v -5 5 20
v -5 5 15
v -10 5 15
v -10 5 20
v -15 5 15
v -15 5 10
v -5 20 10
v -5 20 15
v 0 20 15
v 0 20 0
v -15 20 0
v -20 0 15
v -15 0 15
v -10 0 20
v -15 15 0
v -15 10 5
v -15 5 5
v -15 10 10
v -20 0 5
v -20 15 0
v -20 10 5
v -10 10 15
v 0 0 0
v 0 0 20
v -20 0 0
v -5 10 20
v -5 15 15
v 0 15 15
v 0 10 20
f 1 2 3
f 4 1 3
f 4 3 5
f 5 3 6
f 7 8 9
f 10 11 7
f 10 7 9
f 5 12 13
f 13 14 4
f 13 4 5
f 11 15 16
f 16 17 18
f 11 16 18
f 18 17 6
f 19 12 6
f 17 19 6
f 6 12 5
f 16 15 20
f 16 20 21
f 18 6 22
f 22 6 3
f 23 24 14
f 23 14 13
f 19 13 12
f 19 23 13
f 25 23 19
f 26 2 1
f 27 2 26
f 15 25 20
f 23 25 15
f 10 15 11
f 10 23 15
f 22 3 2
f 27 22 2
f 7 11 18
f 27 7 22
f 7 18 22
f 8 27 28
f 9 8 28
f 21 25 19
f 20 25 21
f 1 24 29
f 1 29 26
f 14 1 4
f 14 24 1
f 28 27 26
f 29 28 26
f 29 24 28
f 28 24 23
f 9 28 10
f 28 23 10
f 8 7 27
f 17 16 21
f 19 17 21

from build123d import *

# Parameters (mm, degrees)
BOSS_EXTRUDE1_DEPTH = 20
SKETCH2_W           = 5
SKETCH2_H           = 15
BOSS_EXTRUDE3_DEPTH = 5
CUT_EXTRUDE2_DEPTH  = 5
BOSS_EXTRUDE4_DEPTH = 20
CUT_EXTRUDE3_DEPTH  = 37
BOSS_EXTRUDE5_DEPTH = 5
SKETCH7_W           = 5
SKETCH7_H           = 5
BOSS_EXTRUDE6_DEPTH = 10
CUT_EXTRUDE4_DEPTH  = 10
BOSS_EXTRUDE7_DEPTH = 5


with BuildPart() as part:
    # Sketch1 → Boss-Extrude1 (new body)
    with BuildSketch(Plane(origin=(0, 0, 0), x_dir=(1, 0, 0), z_dir=(0, 1, 0))):
        Polygon((-15, 0), (0, 0), (0, -15), (-5, -15), (-5, -10), align=None)
    extrude(amount=BOSS_EXTRUDE1_DEPTH)

    # Sketch2 → Boss-Extrude3 (add)
    with BuildSketch(Plane.XY.offset(15)):
        with Locations((-2.5, 7.5)):
            Rectangle(SKETCH2_W, SKETCH2_H)
    extrude(amount=BOSS_EXTRUDE3_DEPTH)

    # Sketch4 → Cut-Extrude2 (cut)
    with BuildSketch(Plane.ZY.offset(5)):
        Polygon((15, 15), (20, 10), (20, 15), align=None)
    extrude(amount=-CUT_EXTRUDE2_DEPTH, mode=Mode.SUBTRACT)

    # Sketch5 → Boss-Extrude4 (add)
    with BuildSketch(Plane(origin=(0, 0, 0), x_dir=(-1, 0, 0), z_dir=(0, -1, 0))):
        Polygon((15, 0), (15, -10), (10, -15), (5, -15), (5, -10), align=None)
    extrude(amount=-BOSS_EXTRUDE4_DEPTH)

    # 3DSketch1 → Cut-Extrude3 (cut, along a direction that is not the sketch's normal)
    with BuildSketch(Plane(origin=(-15, 20, 0), x_dir=(0.5345224838248489, -0.26726124191242445, 0.8017837257372732), z_dir=(0.5773502691896253, -0.5773502691896264, -0.5773502691896257))):
        Polygon((0, 0), (13.363062096, -4.629100499), (18.708286934, 0), (17.371980724, 6.943650748), (10.690449676, 9.258200998), align=None)
    extrude(amount=-CUT_EXTRUDE3_DEPTH, dir=(0, 0, -1), mode=Mode.SUBTRACT)

    # Sketch6 → Boss-Extrude5 (add)
    with BuildSketch(Plane.ZY.offset(15)):
        Polygon((0, 0), (0, 15), (5, 10), (5, 0), align=None)
    extrude(amount=BOSS_EXTRUDE5_DEPTH)

    # Sketch7 → Boss-Extrude6 (add)
    with BuildSketch(Plane.XY.offset(5)):
        with Locations((-17.5, 2.5)):
            Rectangle(SKETCH7_W, SKETCH7_H)
    extrude(amount=BOSS_EXTRUDE6_DEPTH)

    # Sketch8 → Cut-Extrude4 (cut)
    with BuildSketch(Plane.XY.offset(15)):
        Polygon((-20, 0), (-15, 5), (-20, 5), align=None)
    extrude(amount=-CUT_EXTRUDE4_DEPTH, mode=Mode.SUBTRACT)

    # Sketch9 → Boss-Extrude7 (add)
    with BuildSketch(Plane(origin=(0, 0, 0), x_dir=(-1, 0, 0), z_dir=(0, -1, 0))):
        Polygon((15, -15), (15, -10), (10, -15), (5, -15), (5, -20), (10, -20), align=None)
    extrude(amount=-BOSS_EXTRUDE7_DEPTH)


solid = part.part
